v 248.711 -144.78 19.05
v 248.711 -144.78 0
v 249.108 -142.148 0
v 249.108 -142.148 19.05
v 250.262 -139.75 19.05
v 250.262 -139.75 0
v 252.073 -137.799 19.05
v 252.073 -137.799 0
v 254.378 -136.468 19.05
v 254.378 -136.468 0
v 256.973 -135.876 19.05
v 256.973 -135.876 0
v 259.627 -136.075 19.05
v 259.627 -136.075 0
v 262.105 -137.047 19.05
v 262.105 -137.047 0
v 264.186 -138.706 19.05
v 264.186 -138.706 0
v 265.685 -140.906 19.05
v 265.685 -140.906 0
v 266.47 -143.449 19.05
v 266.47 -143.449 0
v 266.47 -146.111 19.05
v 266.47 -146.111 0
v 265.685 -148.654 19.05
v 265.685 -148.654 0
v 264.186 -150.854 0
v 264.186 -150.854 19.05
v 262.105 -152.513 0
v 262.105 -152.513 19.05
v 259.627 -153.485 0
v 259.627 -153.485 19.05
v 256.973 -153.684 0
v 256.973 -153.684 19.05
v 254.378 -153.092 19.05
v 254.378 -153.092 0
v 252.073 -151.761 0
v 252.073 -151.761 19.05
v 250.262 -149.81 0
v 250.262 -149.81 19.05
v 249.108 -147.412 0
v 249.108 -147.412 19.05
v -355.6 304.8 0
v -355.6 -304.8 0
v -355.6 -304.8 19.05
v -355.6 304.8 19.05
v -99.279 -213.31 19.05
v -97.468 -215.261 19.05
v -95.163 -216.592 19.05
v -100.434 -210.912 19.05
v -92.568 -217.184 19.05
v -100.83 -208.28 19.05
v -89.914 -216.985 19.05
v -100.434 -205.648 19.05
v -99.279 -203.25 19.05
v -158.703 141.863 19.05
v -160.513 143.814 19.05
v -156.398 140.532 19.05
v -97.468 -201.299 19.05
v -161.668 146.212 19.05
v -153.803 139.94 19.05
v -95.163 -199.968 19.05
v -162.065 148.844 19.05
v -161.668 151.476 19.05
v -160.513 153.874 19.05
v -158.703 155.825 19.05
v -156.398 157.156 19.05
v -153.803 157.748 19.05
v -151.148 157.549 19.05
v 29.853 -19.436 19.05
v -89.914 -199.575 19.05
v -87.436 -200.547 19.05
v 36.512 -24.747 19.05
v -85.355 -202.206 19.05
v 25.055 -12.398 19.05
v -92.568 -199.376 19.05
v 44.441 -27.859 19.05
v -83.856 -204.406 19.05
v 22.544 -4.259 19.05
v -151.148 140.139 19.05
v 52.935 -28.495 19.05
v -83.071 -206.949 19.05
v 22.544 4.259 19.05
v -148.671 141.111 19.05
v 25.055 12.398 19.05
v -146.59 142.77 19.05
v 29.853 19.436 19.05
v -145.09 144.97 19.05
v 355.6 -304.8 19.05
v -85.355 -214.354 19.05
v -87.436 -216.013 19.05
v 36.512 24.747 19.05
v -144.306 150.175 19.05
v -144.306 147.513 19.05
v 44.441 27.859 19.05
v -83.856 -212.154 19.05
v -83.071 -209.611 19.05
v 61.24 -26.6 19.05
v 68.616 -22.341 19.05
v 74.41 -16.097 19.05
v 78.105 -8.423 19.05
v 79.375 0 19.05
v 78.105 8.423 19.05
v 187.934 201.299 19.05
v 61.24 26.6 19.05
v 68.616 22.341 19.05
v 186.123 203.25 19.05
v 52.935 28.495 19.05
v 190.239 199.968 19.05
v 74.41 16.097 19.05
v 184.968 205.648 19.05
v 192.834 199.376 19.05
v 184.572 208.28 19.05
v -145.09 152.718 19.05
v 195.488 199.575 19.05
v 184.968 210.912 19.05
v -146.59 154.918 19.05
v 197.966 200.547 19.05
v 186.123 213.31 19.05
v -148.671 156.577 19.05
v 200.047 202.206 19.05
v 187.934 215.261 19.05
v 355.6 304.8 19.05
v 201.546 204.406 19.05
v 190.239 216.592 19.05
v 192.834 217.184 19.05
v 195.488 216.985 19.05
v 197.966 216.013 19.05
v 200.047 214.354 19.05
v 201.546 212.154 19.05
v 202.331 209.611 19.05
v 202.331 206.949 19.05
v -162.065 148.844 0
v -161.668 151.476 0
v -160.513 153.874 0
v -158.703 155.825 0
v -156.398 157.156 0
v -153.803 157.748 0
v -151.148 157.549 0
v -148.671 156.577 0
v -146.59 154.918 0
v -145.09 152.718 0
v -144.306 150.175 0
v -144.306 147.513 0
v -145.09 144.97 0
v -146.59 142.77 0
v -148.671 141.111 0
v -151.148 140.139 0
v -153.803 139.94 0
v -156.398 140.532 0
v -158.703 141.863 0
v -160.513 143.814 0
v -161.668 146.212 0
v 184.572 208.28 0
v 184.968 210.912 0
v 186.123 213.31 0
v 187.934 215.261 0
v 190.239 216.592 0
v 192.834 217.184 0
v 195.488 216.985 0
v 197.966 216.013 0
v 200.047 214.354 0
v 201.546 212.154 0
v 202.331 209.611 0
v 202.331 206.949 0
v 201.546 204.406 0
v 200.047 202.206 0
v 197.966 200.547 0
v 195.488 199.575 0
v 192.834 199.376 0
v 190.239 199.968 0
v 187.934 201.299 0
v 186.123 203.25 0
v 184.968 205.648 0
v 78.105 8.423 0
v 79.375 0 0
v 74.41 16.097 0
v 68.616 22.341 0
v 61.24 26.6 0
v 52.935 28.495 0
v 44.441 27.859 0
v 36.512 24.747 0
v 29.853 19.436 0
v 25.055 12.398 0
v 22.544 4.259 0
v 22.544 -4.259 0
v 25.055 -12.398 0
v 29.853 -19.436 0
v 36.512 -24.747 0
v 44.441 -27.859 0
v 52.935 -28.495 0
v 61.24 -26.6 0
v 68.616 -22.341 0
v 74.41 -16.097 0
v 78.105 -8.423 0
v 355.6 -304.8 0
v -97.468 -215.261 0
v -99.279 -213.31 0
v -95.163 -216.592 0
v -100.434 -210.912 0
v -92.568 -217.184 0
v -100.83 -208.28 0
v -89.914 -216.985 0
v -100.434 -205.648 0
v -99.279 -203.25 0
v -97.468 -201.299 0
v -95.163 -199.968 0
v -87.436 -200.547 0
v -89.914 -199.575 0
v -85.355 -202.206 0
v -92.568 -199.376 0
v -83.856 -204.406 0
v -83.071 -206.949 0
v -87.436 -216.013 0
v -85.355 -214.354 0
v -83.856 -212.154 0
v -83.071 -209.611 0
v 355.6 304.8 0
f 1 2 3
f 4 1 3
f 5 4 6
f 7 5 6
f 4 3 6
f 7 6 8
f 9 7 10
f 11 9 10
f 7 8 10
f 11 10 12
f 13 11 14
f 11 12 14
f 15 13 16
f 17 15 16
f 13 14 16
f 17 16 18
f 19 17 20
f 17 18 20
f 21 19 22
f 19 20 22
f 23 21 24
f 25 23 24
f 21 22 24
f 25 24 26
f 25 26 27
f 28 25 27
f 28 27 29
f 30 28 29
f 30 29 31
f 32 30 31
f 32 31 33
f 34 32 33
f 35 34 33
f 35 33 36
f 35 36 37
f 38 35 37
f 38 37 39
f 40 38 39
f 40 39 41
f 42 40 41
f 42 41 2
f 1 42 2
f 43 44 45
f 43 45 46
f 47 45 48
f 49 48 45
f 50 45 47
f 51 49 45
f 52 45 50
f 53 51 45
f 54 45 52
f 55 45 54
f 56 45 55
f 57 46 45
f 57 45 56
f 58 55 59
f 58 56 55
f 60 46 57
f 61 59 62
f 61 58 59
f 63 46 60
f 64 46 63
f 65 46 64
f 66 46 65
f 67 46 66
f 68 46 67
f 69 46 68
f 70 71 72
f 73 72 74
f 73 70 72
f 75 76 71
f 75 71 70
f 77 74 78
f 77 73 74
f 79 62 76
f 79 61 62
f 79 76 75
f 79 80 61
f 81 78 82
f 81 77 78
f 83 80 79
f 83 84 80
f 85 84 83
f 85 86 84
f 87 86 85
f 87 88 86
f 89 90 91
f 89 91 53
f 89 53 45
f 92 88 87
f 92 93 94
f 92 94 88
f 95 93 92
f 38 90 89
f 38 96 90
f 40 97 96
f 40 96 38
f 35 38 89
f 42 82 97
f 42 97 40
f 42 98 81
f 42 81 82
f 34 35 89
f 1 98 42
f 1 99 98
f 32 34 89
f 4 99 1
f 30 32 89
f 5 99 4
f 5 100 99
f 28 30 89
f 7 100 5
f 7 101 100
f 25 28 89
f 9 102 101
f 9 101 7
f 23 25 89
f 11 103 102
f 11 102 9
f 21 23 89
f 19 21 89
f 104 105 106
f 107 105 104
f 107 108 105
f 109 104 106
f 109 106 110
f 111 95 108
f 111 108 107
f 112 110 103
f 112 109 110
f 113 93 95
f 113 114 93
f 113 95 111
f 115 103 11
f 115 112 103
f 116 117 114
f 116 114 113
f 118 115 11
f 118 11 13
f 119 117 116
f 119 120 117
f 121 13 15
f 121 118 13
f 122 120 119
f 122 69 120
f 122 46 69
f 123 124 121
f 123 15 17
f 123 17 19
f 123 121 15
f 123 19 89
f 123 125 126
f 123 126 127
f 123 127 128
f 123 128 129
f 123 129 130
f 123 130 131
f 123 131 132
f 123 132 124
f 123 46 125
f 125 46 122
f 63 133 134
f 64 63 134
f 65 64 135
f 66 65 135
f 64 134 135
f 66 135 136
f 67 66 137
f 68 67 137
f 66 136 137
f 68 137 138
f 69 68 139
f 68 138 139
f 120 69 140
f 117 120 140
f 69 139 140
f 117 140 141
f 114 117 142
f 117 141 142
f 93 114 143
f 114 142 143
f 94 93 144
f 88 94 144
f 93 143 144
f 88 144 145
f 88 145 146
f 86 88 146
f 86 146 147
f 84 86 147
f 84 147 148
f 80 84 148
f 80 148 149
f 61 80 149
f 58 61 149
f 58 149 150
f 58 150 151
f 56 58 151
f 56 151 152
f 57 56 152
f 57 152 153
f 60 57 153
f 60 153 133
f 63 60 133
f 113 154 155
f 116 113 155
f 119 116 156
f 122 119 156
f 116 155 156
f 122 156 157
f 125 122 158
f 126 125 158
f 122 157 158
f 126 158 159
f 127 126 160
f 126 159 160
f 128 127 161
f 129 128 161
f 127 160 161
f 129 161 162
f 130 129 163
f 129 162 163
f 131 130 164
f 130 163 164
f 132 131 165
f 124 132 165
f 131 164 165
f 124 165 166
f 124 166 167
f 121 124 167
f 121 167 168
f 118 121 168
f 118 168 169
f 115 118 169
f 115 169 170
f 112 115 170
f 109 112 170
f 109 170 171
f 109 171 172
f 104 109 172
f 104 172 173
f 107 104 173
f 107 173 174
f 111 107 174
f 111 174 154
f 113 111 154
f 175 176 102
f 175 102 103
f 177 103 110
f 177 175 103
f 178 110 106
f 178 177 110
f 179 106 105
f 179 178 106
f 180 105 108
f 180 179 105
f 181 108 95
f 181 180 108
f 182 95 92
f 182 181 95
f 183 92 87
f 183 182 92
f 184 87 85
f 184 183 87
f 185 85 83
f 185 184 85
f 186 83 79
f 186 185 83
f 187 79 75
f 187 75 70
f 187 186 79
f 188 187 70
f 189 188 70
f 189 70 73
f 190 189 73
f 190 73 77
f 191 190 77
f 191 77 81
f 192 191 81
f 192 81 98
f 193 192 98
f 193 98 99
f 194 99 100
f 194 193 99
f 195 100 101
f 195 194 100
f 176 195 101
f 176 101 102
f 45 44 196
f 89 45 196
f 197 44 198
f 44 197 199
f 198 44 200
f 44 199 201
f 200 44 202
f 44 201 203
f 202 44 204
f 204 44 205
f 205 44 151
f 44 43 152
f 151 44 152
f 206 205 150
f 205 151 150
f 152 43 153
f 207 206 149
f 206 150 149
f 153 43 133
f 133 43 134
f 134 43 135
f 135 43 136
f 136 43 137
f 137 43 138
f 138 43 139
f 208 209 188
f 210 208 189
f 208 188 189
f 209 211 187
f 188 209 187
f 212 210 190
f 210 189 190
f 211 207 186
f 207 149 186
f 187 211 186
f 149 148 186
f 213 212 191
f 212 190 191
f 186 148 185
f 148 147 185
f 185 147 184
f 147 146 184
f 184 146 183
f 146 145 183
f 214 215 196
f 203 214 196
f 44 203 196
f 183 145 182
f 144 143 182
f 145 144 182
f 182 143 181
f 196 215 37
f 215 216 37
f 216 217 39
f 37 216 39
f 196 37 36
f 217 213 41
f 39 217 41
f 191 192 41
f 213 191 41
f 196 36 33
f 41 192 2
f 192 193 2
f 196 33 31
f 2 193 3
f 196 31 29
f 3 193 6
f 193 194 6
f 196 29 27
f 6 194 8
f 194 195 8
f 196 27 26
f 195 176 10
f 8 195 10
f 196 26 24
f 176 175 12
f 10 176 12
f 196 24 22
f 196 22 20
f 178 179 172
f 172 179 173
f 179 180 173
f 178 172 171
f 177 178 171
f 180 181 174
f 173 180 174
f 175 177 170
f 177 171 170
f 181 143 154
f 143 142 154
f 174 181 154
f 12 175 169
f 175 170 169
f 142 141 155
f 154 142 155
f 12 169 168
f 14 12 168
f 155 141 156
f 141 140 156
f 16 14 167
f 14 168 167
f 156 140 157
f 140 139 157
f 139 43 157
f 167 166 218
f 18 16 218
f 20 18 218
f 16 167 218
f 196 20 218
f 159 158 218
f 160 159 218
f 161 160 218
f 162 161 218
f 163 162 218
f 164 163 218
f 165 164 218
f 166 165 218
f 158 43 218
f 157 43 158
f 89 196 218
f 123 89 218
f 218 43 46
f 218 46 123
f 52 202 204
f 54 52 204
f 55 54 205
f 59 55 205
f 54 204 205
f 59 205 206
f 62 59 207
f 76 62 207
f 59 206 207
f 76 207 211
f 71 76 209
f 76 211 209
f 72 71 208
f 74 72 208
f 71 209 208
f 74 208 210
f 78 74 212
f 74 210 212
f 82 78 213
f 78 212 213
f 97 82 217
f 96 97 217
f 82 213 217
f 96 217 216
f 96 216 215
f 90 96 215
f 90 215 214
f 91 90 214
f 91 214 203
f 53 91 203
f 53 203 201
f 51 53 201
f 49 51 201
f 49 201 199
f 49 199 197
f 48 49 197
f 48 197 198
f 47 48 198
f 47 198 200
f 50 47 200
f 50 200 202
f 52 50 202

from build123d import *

# Parameters (mm, degrees)
F0_W     = 711.2
F0_H     = 609.6
F0_R     = 28.575
F1_DEPTH = 19.05
F3_D     = 17.85874


with BuildPart() as f1:
    # F0 (on Top) → F1 (new body)
    with BuildSketch(Plane.XY):
        Rectangle(F0_W, F0_H)
        with Locations((50.8, 0)):
            Circle(F0_R, mode=Mode.SUBTRACT)
    extrude(amount=F1_DEPTH)

    # F3 (through all)
    with Locations(Plane.XY.offset(19.05)):
        with Locations((-153.1352670464, 148.8440036774), (-91.9009929177, -208.2799971104), (257.6402368968, -144.7799950838), (193.5009929177, 208.2799971104)):
            Hole(F3_D / 2)


solid = f1.part
